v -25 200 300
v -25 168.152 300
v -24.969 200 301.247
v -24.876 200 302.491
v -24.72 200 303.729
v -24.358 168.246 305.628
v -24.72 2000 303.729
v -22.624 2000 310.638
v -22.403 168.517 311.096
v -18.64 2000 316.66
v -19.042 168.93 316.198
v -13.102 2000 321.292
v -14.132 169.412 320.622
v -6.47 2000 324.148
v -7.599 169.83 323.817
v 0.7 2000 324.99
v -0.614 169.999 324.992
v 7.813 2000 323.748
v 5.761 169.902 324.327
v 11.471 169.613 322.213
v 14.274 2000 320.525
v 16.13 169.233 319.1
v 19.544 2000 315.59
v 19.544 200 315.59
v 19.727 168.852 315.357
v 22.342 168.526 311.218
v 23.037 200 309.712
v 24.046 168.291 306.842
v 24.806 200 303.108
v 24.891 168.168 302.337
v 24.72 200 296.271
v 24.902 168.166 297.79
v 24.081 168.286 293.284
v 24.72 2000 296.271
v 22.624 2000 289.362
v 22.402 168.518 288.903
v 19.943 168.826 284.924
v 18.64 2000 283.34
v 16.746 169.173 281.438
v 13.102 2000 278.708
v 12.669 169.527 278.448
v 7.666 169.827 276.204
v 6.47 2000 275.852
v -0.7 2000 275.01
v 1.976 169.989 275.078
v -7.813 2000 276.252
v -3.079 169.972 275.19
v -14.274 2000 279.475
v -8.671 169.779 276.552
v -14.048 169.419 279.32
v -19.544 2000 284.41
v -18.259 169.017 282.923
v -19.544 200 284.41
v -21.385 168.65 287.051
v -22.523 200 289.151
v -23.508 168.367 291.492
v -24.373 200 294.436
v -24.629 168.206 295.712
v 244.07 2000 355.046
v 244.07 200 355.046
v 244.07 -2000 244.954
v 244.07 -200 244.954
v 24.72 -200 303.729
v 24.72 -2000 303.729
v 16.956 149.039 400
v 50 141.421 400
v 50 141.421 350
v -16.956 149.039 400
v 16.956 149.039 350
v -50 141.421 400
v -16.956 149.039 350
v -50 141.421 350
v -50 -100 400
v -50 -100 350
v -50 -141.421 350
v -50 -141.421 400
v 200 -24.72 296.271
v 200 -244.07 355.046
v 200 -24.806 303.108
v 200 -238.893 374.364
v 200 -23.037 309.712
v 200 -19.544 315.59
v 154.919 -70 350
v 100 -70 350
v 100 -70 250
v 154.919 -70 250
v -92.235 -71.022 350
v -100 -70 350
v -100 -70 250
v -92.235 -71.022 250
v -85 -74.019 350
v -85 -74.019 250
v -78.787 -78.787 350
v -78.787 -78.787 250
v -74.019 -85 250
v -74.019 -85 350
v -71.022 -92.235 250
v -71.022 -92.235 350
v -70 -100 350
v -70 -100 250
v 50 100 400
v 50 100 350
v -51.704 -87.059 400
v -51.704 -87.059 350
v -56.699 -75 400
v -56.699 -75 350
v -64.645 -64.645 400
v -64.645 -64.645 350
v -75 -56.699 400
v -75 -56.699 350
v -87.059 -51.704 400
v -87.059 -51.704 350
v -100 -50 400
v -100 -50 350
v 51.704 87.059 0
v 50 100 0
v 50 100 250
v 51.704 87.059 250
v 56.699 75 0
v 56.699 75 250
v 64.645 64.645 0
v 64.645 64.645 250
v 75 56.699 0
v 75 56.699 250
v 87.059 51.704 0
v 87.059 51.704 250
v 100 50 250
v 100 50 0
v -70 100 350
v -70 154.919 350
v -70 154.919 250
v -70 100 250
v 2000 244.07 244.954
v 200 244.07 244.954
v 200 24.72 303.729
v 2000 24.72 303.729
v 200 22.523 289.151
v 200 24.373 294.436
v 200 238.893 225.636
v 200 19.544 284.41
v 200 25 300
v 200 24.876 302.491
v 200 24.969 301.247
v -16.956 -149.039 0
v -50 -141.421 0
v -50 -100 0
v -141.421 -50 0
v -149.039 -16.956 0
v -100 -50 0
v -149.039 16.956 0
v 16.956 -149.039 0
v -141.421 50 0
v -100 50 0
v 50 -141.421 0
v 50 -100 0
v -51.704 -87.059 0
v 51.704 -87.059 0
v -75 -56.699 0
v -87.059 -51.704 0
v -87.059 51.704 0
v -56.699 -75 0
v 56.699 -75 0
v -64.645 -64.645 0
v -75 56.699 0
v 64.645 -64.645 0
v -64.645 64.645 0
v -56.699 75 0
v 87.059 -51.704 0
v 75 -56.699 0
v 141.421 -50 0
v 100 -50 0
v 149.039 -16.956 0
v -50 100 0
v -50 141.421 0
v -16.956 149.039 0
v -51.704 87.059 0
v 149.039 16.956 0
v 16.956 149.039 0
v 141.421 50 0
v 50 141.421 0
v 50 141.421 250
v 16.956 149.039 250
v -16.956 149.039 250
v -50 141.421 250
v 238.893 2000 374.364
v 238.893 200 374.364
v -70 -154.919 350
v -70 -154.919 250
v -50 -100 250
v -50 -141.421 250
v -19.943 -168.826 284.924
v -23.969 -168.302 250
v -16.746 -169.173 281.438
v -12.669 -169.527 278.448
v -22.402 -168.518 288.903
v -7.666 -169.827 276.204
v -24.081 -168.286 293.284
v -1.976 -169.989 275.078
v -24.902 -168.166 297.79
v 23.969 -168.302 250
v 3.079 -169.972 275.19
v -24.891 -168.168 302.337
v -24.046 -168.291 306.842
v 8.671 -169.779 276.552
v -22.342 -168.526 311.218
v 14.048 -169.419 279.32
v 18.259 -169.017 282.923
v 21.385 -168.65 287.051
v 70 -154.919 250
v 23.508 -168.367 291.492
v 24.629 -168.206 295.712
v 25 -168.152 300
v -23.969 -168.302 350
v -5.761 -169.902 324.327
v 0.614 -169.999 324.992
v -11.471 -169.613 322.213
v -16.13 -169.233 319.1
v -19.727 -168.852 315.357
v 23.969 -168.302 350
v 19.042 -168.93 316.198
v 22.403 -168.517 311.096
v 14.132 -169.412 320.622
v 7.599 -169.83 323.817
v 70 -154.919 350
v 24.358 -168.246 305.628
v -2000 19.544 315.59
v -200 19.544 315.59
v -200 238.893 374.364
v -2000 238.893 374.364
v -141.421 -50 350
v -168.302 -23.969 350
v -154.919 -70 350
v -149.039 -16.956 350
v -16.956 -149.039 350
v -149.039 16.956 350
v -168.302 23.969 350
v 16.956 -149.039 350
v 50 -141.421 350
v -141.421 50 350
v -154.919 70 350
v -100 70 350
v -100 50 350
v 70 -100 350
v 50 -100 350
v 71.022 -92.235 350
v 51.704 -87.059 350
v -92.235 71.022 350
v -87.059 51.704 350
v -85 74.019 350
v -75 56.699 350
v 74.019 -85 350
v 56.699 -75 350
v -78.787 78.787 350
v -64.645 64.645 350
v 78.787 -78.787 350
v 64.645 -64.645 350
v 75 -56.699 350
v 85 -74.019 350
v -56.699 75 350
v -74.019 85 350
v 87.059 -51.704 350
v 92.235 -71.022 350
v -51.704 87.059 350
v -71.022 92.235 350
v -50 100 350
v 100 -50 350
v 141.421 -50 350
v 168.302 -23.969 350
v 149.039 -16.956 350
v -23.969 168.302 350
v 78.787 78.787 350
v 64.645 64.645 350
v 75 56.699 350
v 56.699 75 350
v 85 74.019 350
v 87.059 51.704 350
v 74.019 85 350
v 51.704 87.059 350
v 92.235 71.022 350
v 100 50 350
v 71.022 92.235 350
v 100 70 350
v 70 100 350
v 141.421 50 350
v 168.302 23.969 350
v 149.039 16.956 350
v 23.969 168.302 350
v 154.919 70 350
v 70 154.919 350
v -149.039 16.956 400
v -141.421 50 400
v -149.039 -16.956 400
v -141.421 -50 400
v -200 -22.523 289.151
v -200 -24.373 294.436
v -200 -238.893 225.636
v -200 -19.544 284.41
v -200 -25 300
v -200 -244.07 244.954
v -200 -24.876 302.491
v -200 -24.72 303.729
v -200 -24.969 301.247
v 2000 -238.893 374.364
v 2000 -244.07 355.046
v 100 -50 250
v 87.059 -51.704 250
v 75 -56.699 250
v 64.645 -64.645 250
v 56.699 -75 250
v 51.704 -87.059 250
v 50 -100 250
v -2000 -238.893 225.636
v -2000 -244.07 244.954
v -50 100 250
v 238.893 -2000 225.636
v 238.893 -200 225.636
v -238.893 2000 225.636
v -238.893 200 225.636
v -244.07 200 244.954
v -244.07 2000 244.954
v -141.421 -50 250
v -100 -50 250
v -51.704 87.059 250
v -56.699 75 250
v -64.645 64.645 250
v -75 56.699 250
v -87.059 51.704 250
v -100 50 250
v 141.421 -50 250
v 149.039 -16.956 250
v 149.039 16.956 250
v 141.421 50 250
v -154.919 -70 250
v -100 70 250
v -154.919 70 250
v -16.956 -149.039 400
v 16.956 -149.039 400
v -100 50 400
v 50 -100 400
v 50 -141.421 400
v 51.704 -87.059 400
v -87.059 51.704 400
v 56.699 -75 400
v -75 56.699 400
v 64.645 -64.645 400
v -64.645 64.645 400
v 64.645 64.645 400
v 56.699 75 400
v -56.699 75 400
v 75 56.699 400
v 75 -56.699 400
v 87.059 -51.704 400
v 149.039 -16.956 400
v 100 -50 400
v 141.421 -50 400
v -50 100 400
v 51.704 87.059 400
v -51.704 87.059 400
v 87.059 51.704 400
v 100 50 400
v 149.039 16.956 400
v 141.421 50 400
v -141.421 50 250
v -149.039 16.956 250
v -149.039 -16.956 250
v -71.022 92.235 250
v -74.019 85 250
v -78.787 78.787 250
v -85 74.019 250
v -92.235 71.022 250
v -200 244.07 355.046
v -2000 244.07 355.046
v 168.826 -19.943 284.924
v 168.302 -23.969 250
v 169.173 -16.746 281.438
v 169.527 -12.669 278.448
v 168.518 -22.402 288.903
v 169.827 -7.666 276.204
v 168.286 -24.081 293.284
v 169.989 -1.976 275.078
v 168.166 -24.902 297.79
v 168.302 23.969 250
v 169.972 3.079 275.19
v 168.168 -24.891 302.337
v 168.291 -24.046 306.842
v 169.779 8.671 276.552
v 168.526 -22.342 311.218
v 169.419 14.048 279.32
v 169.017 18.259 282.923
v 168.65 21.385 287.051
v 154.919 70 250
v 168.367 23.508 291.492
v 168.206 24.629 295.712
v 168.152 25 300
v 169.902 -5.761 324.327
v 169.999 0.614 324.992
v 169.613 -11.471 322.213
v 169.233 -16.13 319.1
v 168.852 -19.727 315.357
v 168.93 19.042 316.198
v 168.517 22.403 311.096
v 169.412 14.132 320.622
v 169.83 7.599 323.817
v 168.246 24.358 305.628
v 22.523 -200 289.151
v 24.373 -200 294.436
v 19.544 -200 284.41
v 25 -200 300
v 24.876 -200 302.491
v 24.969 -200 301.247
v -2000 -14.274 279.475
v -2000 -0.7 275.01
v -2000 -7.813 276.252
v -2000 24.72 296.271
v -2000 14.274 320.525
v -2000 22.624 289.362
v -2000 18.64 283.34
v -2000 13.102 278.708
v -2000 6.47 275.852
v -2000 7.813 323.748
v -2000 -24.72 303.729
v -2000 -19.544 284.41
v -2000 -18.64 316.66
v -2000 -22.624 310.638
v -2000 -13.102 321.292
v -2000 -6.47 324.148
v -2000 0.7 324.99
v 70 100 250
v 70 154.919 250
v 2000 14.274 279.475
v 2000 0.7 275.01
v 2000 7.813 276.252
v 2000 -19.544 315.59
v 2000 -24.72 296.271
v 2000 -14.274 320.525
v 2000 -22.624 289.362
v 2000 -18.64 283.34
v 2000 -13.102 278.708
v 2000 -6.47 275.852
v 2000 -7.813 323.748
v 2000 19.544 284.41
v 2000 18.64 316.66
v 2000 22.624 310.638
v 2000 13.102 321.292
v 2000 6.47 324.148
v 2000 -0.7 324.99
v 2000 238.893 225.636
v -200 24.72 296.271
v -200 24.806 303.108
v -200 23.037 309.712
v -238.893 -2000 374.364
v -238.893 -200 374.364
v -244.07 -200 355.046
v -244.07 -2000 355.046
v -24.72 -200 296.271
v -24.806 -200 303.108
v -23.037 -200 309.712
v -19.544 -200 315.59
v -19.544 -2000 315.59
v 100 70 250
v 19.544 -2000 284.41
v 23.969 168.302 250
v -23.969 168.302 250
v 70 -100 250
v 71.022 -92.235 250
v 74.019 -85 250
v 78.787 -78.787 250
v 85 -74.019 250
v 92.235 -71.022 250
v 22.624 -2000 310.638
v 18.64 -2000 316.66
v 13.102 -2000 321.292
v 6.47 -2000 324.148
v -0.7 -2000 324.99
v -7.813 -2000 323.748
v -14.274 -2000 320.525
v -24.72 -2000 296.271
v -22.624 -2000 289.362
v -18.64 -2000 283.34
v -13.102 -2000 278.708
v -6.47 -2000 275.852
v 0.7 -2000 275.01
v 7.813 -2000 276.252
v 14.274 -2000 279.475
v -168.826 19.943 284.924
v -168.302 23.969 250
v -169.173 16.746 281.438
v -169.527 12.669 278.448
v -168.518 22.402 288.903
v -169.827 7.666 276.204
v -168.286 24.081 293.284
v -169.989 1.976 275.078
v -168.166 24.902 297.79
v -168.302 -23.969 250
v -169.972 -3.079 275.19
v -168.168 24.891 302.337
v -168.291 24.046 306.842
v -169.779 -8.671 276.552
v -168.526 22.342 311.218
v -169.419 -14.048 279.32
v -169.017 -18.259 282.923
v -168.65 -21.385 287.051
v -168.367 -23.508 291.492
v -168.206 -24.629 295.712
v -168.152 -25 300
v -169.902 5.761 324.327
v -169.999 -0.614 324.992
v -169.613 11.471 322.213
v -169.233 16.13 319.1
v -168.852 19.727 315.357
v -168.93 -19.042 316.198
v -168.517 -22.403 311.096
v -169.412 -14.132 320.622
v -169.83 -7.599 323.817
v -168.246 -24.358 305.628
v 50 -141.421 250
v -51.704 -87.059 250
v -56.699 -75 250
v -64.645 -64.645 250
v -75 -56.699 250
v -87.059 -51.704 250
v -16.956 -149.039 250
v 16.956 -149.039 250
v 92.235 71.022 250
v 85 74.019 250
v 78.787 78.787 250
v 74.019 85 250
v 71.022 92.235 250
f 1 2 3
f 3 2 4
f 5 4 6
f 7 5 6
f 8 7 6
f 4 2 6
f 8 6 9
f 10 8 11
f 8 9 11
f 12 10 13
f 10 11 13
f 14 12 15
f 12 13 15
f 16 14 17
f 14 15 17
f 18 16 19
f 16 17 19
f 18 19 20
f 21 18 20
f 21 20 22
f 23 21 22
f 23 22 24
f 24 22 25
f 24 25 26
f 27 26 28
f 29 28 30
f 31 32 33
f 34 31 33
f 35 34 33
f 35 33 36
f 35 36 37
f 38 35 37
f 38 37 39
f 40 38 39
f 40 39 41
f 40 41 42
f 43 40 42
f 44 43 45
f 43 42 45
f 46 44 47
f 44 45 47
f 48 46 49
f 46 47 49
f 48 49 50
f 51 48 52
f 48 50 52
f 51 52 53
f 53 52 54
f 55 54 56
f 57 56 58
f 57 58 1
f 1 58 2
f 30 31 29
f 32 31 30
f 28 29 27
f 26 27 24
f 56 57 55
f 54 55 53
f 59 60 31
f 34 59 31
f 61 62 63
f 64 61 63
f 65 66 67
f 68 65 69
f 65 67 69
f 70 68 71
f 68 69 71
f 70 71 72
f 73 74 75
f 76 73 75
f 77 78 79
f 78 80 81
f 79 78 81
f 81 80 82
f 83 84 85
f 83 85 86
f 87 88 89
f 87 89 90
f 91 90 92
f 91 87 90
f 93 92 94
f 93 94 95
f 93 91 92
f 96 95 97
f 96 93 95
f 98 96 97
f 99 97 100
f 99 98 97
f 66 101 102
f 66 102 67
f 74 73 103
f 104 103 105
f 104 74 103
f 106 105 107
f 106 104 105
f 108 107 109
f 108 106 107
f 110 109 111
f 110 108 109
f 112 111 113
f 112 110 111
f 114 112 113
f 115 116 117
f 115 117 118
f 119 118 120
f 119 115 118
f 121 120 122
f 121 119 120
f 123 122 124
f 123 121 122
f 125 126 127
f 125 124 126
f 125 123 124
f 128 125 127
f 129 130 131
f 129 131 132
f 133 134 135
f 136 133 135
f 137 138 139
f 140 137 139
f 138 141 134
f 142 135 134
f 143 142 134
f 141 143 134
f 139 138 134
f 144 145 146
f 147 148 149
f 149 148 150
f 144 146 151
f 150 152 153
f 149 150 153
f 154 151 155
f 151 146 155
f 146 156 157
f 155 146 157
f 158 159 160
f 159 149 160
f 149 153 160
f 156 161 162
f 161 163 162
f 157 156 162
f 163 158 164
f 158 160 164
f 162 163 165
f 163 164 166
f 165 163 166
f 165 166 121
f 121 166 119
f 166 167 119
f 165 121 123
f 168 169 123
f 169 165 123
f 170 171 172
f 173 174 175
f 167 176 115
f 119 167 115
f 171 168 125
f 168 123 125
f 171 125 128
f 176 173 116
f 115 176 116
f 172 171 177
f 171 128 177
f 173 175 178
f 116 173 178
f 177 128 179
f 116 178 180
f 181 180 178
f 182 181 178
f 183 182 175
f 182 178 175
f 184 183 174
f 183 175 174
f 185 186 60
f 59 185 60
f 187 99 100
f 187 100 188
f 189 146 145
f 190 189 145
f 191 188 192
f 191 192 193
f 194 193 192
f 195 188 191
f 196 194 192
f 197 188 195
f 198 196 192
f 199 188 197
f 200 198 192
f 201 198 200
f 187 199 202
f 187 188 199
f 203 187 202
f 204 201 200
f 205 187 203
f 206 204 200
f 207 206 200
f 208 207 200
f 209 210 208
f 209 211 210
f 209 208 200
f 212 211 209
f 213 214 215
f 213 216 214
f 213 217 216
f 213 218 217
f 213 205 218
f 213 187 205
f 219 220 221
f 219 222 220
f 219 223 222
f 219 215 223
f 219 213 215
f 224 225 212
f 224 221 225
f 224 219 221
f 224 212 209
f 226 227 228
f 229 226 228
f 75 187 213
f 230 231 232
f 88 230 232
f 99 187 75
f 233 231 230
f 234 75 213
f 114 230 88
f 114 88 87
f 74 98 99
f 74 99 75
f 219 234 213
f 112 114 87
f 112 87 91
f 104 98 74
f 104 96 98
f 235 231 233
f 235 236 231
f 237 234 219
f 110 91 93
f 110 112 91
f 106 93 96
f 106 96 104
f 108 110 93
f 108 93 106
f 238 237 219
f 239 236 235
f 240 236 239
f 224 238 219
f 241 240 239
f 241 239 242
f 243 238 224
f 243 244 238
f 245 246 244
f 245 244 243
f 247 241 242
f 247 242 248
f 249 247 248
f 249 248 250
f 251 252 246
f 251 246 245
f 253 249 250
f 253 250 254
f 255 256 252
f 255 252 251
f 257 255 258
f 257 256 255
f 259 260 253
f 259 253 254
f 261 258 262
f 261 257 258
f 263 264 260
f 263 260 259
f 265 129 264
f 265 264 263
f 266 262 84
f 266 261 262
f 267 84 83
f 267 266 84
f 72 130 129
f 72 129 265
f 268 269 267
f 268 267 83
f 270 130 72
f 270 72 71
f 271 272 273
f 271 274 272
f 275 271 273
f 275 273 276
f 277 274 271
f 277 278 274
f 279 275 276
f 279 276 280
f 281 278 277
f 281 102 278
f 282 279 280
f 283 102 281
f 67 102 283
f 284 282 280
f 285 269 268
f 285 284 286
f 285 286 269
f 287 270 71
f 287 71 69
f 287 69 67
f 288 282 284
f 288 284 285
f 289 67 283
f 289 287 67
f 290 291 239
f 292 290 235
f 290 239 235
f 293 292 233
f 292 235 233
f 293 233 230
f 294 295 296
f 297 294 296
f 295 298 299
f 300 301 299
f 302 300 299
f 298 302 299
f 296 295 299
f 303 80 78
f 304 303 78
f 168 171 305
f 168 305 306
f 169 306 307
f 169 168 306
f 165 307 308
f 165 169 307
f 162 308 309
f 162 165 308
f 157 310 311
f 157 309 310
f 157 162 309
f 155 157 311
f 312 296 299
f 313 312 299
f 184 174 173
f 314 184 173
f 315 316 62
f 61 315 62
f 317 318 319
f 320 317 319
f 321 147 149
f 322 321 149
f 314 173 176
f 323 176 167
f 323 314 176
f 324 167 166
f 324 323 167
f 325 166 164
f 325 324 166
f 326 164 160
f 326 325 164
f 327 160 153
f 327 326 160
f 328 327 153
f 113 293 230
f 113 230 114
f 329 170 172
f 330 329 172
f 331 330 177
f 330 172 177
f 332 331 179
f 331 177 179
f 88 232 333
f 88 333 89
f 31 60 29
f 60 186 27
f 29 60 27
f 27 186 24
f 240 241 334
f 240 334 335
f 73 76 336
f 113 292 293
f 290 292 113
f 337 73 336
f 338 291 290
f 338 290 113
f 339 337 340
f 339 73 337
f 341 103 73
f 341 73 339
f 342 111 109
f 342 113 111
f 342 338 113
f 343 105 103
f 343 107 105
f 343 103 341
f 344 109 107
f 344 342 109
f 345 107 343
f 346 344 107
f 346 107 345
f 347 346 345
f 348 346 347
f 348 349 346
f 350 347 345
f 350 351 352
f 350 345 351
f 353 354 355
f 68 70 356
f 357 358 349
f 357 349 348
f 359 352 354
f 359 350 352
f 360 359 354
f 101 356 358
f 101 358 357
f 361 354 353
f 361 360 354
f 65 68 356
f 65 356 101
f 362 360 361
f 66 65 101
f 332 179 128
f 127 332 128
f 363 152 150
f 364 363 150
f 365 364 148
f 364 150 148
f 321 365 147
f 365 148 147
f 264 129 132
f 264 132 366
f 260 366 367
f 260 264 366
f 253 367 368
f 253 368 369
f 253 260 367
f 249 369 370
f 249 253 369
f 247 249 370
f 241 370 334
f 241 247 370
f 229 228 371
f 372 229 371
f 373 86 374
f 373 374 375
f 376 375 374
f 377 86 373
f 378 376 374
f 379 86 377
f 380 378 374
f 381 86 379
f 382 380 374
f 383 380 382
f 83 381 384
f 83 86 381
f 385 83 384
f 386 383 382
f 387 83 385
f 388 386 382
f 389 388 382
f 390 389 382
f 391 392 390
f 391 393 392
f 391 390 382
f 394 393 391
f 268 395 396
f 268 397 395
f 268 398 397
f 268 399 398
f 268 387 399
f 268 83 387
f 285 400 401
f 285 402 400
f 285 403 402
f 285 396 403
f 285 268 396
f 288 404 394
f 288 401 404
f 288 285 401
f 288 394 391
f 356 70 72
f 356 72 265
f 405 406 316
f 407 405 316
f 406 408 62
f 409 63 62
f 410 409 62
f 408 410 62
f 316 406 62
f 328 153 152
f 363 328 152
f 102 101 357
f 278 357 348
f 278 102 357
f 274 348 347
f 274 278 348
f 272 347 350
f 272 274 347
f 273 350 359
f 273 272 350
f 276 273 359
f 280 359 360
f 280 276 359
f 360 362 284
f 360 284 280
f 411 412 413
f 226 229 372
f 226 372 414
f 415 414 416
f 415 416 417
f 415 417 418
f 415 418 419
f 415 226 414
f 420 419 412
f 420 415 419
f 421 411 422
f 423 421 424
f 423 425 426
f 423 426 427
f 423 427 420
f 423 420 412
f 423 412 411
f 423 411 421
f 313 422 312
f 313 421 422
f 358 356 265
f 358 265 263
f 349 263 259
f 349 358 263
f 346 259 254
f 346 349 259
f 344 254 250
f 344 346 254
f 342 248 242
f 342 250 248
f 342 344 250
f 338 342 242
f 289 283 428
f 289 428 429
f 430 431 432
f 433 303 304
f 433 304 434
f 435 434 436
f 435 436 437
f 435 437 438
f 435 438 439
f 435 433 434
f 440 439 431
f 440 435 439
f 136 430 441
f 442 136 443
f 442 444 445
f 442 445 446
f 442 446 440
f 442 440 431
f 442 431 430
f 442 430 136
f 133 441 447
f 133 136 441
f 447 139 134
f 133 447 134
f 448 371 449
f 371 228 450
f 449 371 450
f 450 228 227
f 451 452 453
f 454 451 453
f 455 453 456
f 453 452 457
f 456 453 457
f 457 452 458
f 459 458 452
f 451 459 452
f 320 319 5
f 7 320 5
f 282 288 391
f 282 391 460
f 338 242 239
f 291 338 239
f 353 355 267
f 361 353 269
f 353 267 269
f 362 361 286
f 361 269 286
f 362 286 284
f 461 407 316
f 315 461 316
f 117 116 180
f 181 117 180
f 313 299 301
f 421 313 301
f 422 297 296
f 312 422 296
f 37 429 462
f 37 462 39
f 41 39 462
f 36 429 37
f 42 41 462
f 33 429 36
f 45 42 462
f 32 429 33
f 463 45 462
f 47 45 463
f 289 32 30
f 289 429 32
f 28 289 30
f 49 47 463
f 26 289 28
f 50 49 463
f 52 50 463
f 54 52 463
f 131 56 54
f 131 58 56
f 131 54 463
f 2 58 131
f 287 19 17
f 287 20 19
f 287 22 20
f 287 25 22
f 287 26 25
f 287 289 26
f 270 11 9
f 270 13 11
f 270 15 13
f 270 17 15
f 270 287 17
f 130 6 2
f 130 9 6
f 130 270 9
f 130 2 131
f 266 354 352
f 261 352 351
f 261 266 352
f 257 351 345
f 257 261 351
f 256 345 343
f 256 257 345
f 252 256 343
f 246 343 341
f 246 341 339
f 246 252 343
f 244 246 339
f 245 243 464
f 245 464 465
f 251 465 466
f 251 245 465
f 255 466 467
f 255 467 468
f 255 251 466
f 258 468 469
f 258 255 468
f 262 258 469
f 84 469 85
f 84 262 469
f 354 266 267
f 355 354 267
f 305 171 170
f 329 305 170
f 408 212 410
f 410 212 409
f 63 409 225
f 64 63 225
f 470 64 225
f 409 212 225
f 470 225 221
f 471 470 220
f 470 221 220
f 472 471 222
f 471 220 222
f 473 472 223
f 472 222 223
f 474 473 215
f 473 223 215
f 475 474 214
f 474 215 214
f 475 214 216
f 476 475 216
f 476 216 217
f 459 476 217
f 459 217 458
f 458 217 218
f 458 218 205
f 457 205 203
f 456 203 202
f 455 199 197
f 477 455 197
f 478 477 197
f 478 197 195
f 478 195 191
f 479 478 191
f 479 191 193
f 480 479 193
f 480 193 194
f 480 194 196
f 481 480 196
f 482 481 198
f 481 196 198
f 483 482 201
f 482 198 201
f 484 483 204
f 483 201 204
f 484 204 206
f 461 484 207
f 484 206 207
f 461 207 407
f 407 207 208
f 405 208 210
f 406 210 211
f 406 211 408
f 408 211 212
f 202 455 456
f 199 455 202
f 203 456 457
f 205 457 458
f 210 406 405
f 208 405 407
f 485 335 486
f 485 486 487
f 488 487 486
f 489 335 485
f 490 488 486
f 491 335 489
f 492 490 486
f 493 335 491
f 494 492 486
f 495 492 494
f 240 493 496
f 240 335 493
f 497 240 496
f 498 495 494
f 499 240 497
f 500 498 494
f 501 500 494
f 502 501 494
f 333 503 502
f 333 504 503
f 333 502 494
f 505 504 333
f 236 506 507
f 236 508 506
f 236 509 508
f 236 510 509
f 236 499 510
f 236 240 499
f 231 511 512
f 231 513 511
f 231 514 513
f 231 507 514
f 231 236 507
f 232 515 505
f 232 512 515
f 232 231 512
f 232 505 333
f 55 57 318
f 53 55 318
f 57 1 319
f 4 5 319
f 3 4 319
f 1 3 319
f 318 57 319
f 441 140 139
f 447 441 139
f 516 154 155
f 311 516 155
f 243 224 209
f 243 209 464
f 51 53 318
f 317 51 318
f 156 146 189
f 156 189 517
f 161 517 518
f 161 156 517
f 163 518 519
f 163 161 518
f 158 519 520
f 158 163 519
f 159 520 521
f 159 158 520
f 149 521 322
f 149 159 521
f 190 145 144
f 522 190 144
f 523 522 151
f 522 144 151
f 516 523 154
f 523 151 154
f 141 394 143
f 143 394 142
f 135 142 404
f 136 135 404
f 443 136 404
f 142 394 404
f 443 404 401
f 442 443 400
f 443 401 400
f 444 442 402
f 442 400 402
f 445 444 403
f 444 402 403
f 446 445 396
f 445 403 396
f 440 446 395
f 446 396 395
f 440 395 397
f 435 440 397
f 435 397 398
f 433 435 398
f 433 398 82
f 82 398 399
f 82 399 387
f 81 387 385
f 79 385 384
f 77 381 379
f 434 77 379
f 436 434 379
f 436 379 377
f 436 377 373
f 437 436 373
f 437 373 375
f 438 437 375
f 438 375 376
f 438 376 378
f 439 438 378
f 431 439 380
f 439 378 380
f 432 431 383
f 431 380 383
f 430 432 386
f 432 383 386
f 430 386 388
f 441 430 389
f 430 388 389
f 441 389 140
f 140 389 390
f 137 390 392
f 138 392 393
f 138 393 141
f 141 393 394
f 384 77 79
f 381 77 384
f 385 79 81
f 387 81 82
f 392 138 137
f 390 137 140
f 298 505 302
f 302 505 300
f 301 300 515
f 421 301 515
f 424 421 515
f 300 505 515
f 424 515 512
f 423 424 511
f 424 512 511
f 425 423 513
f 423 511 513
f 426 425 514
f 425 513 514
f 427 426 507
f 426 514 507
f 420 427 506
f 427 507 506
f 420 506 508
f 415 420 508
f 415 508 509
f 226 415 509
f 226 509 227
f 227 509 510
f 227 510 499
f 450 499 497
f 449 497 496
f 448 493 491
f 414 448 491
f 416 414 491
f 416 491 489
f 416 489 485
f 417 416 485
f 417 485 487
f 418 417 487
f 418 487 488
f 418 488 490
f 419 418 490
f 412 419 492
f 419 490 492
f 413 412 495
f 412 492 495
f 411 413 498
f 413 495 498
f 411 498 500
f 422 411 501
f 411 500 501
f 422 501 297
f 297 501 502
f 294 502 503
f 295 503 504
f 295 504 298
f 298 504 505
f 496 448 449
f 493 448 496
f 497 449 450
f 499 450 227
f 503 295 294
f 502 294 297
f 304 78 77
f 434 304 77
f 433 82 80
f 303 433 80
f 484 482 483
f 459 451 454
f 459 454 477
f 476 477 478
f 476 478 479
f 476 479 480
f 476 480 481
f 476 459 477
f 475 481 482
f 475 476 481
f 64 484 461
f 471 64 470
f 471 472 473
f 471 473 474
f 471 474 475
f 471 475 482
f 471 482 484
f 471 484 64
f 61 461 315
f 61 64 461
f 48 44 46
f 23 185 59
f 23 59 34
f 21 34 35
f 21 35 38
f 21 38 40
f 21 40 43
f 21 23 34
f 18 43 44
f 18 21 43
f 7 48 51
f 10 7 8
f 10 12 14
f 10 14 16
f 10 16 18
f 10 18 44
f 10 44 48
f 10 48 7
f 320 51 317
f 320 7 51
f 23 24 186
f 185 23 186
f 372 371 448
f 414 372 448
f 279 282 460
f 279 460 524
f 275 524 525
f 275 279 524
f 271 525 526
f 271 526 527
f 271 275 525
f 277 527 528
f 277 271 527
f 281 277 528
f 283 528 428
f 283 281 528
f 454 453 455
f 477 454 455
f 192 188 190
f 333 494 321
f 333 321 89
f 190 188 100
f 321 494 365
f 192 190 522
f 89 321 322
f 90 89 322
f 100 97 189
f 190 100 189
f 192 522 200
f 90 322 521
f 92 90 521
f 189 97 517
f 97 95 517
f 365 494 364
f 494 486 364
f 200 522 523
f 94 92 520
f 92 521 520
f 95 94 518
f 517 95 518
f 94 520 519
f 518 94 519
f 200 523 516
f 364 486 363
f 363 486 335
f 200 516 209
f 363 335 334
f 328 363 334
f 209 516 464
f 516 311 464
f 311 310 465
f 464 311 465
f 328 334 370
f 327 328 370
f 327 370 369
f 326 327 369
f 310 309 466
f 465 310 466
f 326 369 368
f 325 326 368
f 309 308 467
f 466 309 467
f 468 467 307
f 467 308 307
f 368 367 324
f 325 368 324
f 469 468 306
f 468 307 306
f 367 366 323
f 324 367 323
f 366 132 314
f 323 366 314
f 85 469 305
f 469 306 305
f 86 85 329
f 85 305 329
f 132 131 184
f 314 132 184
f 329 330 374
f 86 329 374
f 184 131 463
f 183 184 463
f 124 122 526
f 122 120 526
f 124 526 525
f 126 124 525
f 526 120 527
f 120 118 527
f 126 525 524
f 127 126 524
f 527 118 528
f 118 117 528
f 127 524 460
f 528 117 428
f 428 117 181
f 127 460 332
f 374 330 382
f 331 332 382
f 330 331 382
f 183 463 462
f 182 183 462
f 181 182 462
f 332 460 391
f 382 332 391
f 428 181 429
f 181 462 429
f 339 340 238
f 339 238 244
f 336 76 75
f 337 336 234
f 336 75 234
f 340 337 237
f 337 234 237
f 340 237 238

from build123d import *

# Parameters (mm, degrees)
BOSS_EXTRUDE1_DEPTH = 400
CIRPATTERN1_COUNT   = 4
FILLET1_R           = 50
BOSS_EXTRUDE2_START = -50
BOSS_EXTRUDE2_DEPTH = 100
SKETCH3_R           = 25
BOSS_EXTRUDE3_DEPTH = 2000
EXTRUDE_THIN1_START = 200
EXTRUDE_THIN1_DEPTH = 1800
CIRPATTERN2_COUNT   = 4


with BuildPart() as part:
    # Sketch1 → Boss-Extrude1 (new body)
    with BuildSketch(Plane(origin=(0, 0, 0), x_dir=(0, 1, 0), z_dir=(0, 0, 1))):
        with BuildLine():
            Line((-50, 141.421356237), (-50, 0))
            Line((-50, 0), (50, 0))
            Line((50, 0), (50, 141.421356237))
            ThreePointArc((50, 141.421356237), (0, 150), (-50, 141.421356237))
        make_face()
    extrude(amount=BOSS_EXTRUDE1_DEPTH)


with BuildPart() as cirpattern1_1:
    # CirPattern1: pattern copy
    add(part.part.rotate(Axis((0, 0, 0), (0, 0, 1)), 1 * 360 / CIRPATTERN1_COUNT))


with BuildPart() as cirpattern1_2:
    # CirPattern1: pattern copy
    add(part.part.rotate(Axis((0, 0, 0), (0, 0, 1)), 2 * 360 / CIRPATTERN1_COUNT))


with BuildPart() as cirpattern1_3:
    # CirPattern1: pattern copy
    add(part.part.rotate(Axis((0, 0, 0), (0, 0, 1)), 3 * 360 / CIRPATTERN1_COUNT))


with BuildPart() as part_1:
    add(part.part)

    # Combine1: union CirPattern1_1, CirPattern1_2, CirPattern1_3
    add(cirpattern1_1.part)
    add(cirpattern1_2.part)
    add(cirpattern1_3.part)

    # Fillet1
    fillet1_edges = [part_1.edges().sort_by_distance(p)[0] for p in [
        (-50, 50, 200),
        (-50, -50, 200),
        (50, -50, 200),
        (50, 50, 200),
    ]]
    fillet(fillet1_edges, radius=FILLET1_R)

    # Sketch2 → Boss-Extrude2 (add)
    with BuildSketch(Plane.XY.offset(400).offset(BOSS_EXTRUDE2_START)):
        with BuildLine():
            Line((-70, 154.919333848), (-70, 100))
            ThreePointArc((-70, 100), (-78.786796564, 78.786796564), (-100, 70))
            Line((-100, 70), (-154.919333848, 70))
            ThreePointArc((-154.919333848, 70), (-170, 0), (-154.919333848, -70))
            Line((-154.919333848, -70), (-100, -70))
            ThreePointArc((-100, -70), (-78.786796564, -78.786796564), (-70, -100))
            Line((-70, -100), (-70, -154.919333848))
            ThreePointArc((-70, -154.919333848), (0, -170), (70, -154.919333848))
            Line((70, -154.919333848), (70, -100))
            ThreePointArc((70, -100), (78.786796564, -78.786796564), (100, -70))
            Line((100, -70), (154.919333848, -70))
            ThreePointArc((154.919333848, -70), (170, 0), (154.919333848, 70))
            Line((154.919333848, 70), (100, 70))
            ThreePointArc((100, 70), (78.786796564, 78.786796564), (70, 100))
            Line((70, 100), (70, 154.919333848))
            ThreePointArc((70, 154.919333848), (0, 170), (-70, 154.919333848))
        make_face()
    extrude(amount=-BOSS_EXTRUDE2_DEPTH)


with BuildPart() as body_2:
    # Sketch3 → Boss-Extrude3 (new body)
    with BuildSketch(Plane(origin=(0, 0, 0), x_dir=(-1, 0, 0), z_dir=(0, 1, 0))):
        with Locations((0, 300)):
            Circle(SKETCH3_R)
    extrude(amount=BOSS_EXTRUDE3_DEPTH)

    # Sketch3<3> → Extrude-Thin1 (add)
    with BuildSketch(Plane(origin=(0, 0, 0), x_dir=(-1, 0, 0), z_dir=(0, 1, 0)).offset(EXTRUDE_THIN1_START)):
        Polygon((-244.069647023, 355.045503013), (238.893266121, 225.635980461), (244.069647023, 244.954496987), (-238.893266121, 374.364019539), align=None)
    extrude(amount=EXTRUDE_THIN1_DEPTH)


with BuildPart() as cirpattern2_1:
    # CirPattern2: pattern copy
    add(body_2.part.rotate(Axis((0, 0, 0), (0, 0, 1)), 1 * 360 / CIRPATTERN2_COUNT))


with BuildPart() as cirpattern2_2:
    # CirPattern2: pattern copy
    add(body_2.part.rotate(Axis((0, 0, 0), (0, 0, 1)), 2 * 360 / CIRPATTERN2_COUNT))


with BuildPart() as cirpattern2_3:
    # CirPattern2: pattern copy
    add(body_2.part.rotate(Axis((0, 0, 0), (0, 0, 1)), 3 * 360 / CIRPATTERN2_COUNT))


with BuildPart() as part_2:
    add(part_1.part)

    # Combine2: union body 2, CirPattern2_1, CirPattern2_2, CirPattern2_3
    add(body_2.part)
    add(cirpattern2_1.part)
    add(cirpattern2_2.part)
    add(cirpattern2_3.part)


solid = part_2.part
